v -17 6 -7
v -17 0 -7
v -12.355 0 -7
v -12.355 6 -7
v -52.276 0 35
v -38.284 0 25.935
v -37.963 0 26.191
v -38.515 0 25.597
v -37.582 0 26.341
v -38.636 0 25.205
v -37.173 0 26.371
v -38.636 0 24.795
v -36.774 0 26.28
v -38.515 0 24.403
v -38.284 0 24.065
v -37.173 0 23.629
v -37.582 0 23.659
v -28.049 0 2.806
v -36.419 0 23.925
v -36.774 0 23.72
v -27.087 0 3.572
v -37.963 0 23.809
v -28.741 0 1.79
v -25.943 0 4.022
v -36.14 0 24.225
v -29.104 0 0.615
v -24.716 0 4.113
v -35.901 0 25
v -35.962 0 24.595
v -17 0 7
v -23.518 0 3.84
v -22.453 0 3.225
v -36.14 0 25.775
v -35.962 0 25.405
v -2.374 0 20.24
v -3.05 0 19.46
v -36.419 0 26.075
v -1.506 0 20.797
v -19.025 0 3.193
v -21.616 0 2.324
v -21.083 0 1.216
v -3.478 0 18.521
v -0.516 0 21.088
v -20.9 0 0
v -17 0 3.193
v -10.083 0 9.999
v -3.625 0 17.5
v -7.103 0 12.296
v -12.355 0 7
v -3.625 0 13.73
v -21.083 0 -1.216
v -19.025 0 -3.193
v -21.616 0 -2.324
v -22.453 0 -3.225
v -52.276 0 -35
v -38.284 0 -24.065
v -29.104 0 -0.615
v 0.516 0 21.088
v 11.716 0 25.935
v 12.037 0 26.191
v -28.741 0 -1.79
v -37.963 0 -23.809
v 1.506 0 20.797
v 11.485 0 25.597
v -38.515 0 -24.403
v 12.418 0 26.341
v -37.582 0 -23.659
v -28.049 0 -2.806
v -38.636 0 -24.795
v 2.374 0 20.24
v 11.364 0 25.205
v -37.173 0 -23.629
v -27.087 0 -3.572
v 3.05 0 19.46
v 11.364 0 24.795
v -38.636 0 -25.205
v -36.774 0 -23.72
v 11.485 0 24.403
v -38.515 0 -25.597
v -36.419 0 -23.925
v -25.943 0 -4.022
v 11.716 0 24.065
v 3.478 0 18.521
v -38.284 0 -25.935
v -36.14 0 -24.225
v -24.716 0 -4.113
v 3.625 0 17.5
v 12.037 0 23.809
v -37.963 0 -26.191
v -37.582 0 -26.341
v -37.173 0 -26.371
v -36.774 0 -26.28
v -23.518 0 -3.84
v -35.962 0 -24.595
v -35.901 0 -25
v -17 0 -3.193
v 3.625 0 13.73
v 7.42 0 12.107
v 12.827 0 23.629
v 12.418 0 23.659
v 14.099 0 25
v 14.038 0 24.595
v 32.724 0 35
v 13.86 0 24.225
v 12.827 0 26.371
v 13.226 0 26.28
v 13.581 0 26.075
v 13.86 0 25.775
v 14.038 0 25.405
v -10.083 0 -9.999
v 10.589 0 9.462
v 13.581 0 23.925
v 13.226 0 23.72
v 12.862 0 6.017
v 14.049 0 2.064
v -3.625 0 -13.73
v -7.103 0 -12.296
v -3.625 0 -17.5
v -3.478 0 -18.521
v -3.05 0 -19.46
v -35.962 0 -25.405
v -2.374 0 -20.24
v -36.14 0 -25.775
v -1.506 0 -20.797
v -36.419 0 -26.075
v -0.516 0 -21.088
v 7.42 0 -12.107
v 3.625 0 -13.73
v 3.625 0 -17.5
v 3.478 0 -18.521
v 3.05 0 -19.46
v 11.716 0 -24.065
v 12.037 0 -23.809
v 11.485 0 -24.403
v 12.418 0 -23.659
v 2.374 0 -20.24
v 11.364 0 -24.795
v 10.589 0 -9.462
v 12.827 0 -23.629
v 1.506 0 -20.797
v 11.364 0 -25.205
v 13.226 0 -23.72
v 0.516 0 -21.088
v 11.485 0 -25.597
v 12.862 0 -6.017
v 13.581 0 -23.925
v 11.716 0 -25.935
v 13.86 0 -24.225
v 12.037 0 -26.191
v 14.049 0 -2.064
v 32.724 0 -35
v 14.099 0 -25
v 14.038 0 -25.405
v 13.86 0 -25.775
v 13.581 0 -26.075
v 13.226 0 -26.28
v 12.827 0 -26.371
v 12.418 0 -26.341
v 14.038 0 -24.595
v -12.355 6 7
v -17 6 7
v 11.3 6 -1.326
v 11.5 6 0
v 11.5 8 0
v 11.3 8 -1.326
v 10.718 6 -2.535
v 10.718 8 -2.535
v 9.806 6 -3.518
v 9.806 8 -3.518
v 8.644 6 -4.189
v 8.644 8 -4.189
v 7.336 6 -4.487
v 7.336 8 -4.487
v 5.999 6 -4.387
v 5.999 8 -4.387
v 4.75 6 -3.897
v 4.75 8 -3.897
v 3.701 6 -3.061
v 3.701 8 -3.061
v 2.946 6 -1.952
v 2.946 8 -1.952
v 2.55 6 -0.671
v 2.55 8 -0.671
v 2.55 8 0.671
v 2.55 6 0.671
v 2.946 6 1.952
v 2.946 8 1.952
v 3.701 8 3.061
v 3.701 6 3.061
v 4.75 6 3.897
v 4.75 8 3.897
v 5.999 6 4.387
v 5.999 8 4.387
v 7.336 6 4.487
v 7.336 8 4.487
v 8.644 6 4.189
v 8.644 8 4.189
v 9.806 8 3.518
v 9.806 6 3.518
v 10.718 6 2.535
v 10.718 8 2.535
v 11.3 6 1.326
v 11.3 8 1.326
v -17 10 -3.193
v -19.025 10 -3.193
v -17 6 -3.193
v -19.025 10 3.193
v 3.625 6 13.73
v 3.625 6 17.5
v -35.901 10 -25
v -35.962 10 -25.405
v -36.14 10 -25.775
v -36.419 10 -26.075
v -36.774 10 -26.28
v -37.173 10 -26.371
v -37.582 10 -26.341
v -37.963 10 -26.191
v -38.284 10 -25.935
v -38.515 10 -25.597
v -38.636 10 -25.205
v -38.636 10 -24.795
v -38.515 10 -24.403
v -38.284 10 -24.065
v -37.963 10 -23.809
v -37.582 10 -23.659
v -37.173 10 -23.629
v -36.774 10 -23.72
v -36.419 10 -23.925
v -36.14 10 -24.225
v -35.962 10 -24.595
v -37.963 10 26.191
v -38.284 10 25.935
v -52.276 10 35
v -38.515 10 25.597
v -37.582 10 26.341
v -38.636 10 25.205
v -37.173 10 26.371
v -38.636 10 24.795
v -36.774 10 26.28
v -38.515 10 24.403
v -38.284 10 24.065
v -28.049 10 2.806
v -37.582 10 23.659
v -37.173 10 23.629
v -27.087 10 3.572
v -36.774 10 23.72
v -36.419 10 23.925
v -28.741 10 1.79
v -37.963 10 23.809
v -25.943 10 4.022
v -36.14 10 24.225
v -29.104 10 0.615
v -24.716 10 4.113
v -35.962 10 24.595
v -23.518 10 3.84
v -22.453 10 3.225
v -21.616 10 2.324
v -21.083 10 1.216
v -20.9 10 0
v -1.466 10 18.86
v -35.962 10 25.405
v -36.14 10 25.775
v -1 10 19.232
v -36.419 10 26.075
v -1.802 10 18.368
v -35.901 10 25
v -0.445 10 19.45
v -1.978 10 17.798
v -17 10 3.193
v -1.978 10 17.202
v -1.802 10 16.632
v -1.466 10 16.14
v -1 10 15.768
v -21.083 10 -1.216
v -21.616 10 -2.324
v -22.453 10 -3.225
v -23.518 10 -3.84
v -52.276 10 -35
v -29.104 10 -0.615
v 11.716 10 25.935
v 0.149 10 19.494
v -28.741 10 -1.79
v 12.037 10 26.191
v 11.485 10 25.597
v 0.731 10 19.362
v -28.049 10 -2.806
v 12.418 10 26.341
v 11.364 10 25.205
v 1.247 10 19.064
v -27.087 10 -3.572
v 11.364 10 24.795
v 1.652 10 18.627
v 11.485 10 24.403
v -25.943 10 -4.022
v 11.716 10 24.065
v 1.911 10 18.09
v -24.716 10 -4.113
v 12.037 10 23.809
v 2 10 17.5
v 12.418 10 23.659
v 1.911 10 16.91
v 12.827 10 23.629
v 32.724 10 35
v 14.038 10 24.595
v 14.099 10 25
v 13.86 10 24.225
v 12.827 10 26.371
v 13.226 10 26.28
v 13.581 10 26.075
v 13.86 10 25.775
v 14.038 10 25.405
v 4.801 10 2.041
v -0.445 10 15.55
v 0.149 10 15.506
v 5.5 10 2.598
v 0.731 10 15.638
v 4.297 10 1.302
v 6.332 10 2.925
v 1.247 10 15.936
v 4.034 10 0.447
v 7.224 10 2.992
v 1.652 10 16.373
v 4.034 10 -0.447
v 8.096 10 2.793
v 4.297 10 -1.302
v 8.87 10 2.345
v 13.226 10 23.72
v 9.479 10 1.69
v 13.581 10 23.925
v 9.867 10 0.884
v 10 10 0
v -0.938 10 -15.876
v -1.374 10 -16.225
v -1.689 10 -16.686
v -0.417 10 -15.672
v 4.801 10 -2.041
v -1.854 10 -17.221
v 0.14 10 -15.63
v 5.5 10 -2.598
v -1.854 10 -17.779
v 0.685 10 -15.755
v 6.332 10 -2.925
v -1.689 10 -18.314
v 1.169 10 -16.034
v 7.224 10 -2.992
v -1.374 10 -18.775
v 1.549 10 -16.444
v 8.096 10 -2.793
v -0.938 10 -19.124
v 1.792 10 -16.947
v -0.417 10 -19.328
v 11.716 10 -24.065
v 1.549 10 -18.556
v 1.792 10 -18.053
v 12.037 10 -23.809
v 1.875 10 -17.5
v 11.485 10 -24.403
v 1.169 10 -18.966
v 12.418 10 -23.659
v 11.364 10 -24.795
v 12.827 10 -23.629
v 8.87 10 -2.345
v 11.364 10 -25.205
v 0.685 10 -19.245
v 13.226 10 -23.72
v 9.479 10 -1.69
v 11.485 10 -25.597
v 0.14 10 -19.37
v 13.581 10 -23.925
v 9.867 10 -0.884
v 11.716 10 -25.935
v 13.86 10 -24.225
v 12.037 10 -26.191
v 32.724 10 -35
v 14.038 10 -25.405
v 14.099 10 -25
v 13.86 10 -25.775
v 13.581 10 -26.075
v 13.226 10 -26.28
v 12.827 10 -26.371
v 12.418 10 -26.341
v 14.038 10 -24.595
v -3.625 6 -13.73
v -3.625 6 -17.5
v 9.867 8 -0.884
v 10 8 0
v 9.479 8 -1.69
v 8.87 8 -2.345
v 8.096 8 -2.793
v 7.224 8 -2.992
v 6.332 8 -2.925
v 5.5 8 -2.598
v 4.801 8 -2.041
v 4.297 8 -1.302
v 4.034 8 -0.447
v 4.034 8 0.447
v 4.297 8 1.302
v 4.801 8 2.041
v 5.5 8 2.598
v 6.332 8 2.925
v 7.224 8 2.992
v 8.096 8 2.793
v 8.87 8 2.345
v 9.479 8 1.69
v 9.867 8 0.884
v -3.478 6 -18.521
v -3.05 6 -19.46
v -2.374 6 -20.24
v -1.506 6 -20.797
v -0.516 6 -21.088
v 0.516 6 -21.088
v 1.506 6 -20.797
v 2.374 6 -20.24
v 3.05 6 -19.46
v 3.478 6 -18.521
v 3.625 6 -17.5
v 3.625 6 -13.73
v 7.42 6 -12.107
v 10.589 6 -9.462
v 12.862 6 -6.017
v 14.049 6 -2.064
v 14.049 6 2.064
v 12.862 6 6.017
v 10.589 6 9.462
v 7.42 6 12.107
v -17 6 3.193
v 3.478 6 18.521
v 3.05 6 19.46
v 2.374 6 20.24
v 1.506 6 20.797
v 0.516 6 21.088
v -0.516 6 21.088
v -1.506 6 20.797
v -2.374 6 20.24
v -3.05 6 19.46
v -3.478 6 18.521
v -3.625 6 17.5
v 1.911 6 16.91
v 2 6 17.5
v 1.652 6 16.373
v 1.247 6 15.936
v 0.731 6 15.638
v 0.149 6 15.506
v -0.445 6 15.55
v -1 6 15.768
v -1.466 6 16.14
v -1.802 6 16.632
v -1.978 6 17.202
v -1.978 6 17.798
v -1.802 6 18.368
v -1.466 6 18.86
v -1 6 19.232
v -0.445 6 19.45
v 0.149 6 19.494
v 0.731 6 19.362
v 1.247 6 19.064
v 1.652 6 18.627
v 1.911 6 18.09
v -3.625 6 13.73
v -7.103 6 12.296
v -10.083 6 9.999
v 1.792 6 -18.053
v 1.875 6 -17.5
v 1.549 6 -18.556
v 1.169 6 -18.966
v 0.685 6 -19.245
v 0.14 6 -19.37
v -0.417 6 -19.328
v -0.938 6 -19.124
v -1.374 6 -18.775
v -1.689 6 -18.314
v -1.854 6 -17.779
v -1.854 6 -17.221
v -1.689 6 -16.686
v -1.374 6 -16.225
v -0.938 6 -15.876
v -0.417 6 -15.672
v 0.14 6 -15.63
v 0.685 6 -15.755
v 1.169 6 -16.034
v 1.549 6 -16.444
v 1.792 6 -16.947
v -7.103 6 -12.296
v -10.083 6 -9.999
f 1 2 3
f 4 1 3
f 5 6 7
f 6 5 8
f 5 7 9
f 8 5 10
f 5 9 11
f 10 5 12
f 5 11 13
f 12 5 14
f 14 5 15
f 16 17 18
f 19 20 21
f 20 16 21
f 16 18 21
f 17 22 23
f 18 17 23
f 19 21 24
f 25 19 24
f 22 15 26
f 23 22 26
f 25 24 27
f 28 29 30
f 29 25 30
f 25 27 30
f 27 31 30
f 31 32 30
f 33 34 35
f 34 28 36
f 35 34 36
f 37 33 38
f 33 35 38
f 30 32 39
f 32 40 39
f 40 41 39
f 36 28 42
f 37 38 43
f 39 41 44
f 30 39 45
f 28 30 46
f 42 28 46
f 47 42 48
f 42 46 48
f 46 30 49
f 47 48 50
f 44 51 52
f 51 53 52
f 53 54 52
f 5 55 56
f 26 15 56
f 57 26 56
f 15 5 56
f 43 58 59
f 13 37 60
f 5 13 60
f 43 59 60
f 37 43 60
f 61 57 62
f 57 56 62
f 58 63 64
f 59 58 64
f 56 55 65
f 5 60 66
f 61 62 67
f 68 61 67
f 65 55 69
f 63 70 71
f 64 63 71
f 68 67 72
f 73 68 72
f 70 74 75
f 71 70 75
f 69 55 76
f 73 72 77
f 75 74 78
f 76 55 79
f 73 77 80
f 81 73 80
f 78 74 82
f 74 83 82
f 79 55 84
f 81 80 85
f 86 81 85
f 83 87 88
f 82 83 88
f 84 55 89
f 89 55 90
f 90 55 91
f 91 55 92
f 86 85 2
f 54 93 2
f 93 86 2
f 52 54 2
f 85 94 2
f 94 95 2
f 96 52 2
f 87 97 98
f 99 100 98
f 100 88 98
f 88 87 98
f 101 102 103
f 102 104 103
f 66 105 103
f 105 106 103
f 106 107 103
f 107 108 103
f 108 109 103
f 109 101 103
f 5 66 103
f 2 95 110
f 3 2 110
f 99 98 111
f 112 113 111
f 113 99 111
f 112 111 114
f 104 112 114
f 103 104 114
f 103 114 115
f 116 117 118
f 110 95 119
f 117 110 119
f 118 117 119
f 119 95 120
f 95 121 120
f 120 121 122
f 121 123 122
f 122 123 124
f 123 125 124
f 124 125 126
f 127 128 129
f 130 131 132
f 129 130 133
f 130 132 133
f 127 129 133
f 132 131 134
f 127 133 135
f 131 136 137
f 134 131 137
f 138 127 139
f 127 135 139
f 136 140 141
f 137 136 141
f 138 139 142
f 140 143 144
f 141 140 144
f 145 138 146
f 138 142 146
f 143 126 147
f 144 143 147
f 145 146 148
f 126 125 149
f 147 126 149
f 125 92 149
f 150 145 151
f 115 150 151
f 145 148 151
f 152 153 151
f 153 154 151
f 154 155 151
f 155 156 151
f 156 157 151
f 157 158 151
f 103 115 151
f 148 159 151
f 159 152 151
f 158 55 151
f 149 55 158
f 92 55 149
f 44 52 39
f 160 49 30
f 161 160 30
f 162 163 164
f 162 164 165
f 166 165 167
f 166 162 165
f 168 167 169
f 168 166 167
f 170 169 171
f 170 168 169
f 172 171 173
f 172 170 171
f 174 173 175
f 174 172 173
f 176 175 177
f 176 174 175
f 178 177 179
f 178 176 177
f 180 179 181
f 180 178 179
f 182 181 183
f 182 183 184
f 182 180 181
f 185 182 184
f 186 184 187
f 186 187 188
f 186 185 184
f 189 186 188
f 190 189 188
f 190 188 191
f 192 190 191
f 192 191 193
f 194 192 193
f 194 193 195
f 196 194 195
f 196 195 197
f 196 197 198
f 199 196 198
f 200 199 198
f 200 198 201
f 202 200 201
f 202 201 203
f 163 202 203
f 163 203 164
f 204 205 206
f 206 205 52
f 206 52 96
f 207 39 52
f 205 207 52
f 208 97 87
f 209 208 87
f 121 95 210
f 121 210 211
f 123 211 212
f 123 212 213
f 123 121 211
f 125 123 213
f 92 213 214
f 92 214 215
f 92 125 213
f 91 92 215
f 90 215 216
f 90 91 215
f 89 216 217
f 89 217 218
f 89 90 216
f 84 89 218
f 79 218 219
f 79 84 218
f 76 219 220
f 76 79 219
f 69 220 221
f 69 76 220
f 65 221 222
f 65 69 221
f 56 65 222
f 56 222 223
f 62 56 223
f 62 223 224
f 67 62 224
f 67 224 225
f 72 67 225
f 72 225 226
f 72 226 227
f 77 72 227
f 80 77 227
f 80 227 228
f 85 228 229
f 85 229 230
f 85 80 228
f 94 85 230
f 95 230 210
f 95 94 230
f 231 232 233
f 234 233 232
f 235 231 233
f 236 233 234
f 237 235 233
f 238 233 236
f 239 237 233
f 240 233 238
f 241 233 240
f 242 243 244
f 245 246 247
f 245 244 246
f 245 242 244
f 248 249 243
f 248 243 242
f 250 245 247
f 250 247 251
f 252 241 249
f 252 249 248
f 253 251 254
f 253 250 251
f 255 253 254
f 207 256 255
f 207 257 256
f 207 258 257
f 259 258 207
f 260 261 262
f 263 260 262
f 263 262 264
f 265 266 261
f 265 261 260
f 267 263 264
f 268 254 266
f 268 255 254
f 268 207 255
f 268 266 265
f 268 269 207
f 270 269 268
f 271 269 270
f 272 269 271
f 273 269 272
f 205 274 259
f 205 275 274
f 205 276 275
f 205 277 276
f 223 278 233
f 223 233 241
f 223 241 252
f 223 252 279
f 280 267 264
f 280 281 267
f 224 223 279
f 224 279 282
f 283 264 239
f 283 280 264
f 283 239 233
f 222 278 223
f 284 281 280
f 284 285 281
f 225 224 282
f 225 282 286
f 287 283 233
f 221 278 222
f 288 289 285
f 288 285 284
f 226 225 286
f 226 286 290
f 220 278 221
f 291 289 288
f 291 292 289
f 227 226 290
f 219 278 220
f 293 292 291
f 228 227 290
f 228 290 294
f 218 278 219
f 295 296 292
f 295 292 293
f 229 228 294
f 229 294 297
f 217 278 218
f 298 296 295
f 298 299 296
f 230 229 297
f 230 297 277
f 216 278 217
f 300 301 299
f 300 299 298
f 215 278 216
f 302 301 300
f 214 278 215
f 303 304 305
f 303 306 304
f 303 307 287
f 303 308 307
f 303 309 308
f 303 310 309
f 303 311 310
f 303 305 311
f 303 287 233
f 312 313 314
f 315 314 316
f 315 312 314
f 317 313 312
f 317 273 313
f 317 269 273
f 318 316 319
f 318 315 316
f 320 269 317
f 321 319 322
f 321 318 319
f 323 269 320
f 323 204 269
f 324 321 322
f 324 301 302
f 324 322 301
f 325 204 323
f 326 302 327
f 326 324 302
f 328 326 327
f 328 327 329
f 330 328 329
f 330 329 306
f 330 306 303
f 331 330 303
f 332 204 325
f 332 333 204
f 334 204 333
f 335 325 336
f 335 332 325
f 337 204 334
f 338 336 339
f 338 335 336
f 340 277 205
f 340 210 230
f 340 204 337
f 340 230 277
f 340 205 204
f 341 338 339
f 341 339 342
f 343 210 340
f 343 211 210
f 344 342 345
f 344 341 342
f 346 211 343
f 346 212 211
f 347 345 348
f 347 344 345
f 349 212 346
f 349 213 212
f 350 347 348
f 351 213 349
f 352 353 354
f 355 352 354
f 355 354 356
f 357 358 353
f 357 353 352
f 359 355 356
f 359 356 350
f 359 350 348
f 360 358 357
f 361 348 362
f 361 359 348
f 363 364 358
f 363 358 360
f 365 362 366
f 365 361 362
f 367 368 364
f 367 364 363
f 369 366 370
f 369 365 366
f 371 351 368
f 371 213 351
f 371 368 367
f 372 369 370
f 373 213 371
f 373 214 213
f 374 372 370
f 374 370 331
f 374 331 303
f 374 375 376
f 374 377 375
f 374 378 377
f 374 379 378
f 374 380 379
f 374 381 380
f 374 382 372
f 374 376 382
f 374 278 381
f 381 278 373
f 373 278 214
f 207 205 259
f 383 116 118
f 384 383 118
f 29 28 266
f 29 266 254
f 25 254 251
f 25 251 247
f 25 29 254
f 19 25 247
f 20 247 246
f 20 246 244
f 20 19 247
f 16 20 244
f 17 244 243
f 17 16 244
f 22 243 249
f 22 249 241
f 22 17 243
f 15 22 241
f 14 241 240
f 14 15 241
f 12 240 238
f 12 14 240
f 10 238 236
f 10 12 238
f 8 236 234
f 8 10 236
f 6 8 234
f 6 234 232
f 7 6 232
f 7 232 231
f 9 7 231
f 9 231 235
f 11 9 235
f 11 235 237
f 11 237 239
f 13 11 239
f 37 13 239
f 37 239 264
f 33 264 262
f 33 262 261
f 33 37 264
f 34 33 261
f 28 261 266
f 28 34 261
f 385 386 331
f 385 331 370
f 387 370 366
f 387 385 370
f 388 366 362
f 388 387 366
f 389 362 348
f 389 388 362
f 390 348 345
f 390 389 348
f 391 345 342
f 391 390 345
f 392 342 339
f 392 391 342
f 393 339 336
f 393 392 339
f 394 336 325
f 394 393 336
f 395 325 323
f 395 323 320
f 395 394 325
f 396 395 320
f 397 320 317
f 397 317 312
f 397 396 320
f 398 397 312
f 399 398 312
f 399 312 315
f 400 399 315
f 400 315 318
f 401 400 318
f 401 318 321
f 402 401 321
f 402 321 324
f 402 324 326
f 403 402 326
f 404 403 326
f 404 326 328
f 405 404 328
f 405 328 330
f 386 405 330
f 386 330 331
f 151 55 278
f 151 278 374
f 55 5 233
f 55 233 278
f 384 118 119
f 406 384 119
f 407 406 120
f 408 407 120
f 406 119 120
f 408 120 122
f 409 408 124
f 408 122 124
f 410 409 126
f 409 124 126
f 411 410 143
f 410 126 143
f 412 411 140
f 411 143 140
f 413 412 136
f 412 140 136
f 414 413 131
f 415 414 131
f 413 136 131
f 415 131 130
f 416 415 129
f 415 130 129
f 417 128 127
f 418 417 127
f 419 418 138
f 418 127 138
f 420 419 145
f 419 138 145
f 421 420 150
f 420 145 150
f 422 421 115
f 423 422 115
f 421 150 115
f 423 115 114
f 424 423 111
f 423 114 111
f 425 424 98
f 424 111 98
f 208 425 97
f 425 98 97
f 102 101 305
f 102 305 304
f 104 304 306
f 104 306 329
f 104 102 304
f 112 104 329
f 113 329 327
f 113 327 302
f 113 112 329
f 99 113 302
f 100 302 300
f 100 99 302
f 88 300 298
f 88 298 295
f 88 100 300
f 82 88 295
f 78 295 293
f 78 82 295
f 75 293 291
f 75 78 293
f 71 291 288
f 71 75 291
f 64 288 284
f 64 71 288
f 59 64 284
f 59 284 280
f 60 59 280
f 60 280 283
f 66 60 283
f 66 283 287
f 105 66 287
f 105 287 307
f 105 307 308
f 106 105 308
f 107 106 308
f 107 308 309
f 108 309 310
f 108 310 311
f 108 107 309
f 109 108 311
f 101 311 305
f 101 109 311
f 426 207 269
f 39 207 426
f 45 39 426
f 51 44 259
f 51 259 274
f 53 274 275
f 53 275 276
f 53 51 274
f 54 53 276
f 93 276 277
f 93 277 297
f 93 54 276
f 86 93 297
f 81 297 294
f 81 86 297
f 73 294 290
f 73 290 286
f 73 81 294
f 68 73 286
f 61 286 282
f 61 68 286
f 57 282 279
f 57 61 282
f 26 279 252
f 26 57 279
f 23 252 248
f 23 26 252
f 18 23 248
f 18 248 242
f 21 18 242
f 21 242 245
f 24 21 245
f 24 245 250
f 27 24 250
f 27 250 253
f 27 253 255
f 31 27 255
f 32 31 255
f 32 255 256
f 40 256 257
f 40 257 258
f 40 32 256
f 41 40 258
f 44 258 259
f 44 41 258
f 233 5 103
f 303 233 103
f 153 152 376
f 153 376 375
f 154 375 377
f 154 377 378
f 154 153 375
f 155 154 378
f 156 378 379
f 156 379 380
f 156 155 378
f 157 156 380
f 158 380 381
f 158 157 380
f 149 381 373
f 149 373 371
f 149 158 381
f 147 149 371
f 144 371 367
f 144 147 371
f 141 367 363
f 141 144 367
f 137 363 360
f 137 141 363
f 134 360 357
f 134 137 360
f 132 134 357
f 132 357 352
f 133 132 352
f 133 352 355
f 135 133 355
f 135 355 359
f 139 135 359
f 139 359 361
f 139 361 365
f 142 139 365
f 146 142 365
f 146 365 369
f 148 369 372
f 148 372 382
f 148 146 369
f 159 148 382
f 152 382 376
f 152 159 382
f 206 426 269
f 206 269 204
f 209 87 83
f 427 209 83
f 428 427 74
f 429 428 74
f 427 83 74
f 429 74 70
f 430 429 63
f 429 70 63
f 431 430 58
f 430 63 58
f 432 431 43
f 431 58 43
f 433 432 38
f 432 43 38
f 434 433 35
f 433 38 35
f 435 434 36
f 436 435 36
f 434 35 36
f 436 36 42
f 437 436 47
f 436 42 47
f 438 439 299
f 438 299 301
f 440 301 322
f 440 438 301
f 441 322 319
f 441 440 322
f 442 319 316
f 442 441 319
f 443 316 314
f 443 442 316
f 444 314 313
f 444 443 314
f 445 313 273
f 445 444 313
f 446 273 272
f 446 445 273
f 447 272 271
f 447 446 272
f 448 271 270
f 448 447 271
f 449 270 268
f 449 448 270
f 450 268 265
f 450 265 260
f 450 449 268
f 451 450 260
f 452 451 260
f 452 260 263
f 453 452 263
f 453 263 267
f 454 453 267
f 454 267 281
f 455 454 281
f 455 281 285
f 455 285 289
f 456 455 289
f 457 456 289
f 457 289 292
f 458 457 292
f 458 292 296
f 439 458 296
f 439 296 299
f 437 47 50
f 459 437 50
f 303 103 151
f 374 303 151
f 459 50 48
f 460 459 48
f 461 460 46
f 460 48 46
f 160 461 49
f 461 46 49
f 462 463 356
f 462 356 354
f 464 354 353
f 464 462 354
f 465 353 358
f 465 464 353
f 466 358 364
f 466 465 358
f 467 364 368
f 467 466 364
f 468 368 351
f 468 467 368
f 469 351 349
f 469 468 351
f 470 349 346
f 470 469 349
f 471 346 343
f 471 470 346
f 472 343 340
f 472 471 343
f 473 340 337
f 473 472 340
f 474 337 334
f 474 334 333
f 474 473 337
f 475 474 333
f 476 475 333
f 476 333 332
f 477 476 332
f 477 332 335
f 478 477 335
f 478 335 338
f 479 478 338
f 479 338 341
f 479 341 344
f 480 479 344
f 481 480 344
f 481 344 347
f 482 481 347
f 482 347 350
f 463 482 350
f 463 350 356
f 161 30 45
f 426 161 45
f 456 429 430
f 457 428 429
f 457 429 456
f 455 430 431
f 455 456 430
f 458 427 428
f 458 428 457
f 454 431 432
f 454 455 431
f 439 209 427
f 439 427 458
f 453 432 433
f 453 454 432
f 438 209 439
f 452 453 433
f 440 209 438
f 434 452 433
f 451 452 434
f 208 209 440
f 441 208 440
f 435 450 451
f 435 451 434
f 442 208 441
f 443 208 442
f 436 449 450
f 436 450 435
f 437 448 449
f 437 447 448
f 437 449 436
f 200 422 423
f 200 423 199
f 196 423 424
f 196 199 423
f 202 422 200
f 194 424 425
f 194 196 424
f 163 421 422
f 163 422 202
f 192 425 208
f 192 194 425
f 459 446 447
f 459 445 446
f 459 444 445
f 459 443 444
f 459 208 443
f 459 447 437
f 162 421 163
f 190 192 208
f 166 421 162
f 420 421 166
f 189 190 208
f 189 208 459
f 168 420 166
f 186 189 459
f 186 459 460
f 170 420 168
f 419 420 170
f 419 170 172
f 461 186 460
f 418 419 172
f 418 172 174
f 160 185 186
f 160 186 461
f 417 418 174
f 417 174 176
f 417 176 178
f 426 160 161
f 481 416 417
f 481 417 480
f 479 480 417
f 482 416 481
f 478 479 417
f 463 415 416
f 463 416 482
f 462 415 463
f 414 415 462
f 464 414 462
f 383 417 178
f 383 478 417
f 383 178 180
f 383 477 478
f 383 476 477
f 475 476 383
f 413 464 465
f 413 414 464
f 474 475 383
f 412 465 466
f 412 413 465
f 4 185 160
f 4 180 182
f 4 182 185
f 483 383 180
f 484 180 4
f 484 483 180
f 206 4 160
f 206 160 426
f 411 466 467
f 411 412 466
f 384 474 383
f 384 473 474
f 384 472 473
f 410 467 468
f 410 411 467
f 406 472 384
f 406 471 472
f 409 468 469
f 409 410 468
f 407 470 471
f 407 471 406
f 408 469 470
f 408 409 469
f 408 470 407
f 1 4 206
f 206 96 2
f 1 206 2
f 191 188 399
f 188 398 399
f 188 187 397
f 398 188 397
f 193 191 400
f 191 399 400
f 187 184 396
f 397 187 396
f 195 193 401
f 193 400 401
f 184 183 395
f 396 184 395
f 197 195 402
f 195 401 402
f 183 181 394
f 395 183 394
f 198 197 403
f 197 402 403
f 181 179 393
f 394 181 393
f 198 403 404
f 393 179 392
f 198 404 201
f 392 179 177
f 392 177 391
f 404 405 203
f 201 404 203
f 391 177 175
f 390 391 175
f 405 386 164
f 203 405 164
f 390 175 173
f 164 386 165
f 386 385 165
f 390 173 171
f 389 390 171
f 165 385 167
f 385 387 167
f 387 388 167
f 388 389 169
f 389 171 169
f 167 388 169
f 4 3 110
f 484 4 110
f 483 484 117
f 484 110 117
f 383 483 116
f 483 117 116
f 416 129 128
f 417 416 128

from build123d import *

# Parameters (mm, degrees)
SKETCH1_W           = 85
SKETCH1_H           = 70
SKETCH1_R           = 1.375
SKETCH1_R_2         = 4.125
SKETCH1_W_2         = 2.024682369
SKETCH1_H_2         = 6.385975888
SKETCH1_R_3         = 1.875
SKETCH1_R_4         = 2
SKETCH1_R_5         = 3
BOSS_EXTRUDE4_DEPTH = 10
SKETCH1_7_R         = 2
SKETCH1_7_R_2       = 4.5
SKETCH1_7_R_3       = 1.875
CUT_EXTRUDE2_DEPTH  = 6
SKETCH1_11_R        = 4.5
SKETCH1_11_R_2      = 3
CUT_EXTRUDE10_DEPTH = 8


with BuildPart() as part:
    # Sketch1 → Boss-Extrude4 (new body)
    with BuildSketch(Plane(origin=(0, 0, 0), x_dir=(1, 0, 0), z_dir=(0, 1, 0))):
        with Locations((-9.775924906, 0)):
            Rectangle(SKETCH1_W, SKETCH1_H)
        with Locations((-37.275924906, -25)):
            Circle(SKETCH1_R, mode=Mode.SUBTRACT)
        with Locations((12.724075094, -25)):
            Circle(SKETCH1_R, mode=Mode.SUBTRACT)
        with Locations((-25.024682369, 0)):
            Circle(SKETCH1_R_2, mode=Mode.SUBTRACT)
        with Locations((-18.012341185, 0)):
            Rectangle(SKETCH1_W_2, SKETCH1_H_2, mode=Mode.SUBTRACT)
        with Locations((-37.275924906, 25)):
            Circle(SKETCH1_R, mode=Mode.SUBTRACT)
        with Locations((12.724075094, 25)):
            Circle(SKETCH1_R, mode=Mode.SUBTRACT)
        with Locations((0, 17.5)):
            Circle(SKETCH1_R_3, mode=Mode.SUBTRACT)
        with Locations((0, -17.5)):
            Circle(SKETCH1_R_4, mode=Mode.SUBTRACT)
        with Locations((7, 0)):
            Circle(SKETCH1_R_5, mode=Mode.SUBTRACT)
    extrude(amount=BOSS_EXTRUDE4_DEPTH)

    # Sketch1<7> → Cut-Extrude2 (cut)
    with BuildSketch(Plane(origin=(0, 0, 0), x_dir=(1, 0, 0), z_dir=(0, 1, 0))):
        with BuildLine():
            Line((3.625, 13.729507457), (3.625, 17.5))
            ThreePointArc((3.625, 17.5), (0, 21.125), (-3.625, 17.5))
            Line((-3.625, 17.5), (-3.625, 13.729507457))
            ThreePointArc((-3.625, 13.729507457), (-8.669470541, 11.246345208), (-12.354756169, 7))
            Line((-12.354756169, 7), (-17, 7))
            Line((-17, 7), (-17, 3.192987944))
            Line((-17, 3.192987944), (-19.024682369, 3.192987944))
            Line((-19.024682369, 3.192987944), (-19.024682369, -3.192987944))
            Line((-19.024682369, -3.192987944), (-17, -3.192987944))
            Line((-17, -3.192987944), (-17, -7))
            Line((-17, -7), (-12.354756169, -7))
            ThreePointArc((-12.354756169, -7), (-8.669470541, -11.246345208), (-3.625, -13.729507457))
            Line((-3.625, -13.729507457), (-3.625, -17.5))
            ThreePointArc((-3.625, -17.5), (0, -21.125), (3.625, -17.5))
            Line((3.625, -17.5), (3.625, -13.729507457))
            ThreePointArc((3.625, -13.729507457), (14.2, 0), (3.625, 13.729507457))
        make_face()
        with Locations((0, -17.5)):
            Circle(SKETCH1_7_R, mode=Mode.SUBTRACT)
        with Locations((7, 0)):
            Circle(SKETCH1_7_R_2, mode=Mode.SUBTRACT)
        with Locations((0, 17.5)):
            Circle(SKETCH1_7_R_3, mode=Mode.SUBTRACT)
    extrude(amount=CUT_EXTRUDE2_DEPTH, mode=Mode.SUBTRACT)

    # Sketch1<11> → Cut-Extrude10 (cut)
    with BuildSketch(Plane(origin=(0, 0, 0), x_dir=(1, 0, 0), z_dir=(0, 1, 0))):
        with Locations((7, 0)):
            Circle(SKETCH1_11_R)
        with Locations((7, 0)):
            Circle(SKETCH1_11_R_2, mode=Mode.SUBTRACT)
    extrude(amount=CUT_EXTRUDE10_DEPTH, mode=Mode.SUBTRACT)


solid = part.part
